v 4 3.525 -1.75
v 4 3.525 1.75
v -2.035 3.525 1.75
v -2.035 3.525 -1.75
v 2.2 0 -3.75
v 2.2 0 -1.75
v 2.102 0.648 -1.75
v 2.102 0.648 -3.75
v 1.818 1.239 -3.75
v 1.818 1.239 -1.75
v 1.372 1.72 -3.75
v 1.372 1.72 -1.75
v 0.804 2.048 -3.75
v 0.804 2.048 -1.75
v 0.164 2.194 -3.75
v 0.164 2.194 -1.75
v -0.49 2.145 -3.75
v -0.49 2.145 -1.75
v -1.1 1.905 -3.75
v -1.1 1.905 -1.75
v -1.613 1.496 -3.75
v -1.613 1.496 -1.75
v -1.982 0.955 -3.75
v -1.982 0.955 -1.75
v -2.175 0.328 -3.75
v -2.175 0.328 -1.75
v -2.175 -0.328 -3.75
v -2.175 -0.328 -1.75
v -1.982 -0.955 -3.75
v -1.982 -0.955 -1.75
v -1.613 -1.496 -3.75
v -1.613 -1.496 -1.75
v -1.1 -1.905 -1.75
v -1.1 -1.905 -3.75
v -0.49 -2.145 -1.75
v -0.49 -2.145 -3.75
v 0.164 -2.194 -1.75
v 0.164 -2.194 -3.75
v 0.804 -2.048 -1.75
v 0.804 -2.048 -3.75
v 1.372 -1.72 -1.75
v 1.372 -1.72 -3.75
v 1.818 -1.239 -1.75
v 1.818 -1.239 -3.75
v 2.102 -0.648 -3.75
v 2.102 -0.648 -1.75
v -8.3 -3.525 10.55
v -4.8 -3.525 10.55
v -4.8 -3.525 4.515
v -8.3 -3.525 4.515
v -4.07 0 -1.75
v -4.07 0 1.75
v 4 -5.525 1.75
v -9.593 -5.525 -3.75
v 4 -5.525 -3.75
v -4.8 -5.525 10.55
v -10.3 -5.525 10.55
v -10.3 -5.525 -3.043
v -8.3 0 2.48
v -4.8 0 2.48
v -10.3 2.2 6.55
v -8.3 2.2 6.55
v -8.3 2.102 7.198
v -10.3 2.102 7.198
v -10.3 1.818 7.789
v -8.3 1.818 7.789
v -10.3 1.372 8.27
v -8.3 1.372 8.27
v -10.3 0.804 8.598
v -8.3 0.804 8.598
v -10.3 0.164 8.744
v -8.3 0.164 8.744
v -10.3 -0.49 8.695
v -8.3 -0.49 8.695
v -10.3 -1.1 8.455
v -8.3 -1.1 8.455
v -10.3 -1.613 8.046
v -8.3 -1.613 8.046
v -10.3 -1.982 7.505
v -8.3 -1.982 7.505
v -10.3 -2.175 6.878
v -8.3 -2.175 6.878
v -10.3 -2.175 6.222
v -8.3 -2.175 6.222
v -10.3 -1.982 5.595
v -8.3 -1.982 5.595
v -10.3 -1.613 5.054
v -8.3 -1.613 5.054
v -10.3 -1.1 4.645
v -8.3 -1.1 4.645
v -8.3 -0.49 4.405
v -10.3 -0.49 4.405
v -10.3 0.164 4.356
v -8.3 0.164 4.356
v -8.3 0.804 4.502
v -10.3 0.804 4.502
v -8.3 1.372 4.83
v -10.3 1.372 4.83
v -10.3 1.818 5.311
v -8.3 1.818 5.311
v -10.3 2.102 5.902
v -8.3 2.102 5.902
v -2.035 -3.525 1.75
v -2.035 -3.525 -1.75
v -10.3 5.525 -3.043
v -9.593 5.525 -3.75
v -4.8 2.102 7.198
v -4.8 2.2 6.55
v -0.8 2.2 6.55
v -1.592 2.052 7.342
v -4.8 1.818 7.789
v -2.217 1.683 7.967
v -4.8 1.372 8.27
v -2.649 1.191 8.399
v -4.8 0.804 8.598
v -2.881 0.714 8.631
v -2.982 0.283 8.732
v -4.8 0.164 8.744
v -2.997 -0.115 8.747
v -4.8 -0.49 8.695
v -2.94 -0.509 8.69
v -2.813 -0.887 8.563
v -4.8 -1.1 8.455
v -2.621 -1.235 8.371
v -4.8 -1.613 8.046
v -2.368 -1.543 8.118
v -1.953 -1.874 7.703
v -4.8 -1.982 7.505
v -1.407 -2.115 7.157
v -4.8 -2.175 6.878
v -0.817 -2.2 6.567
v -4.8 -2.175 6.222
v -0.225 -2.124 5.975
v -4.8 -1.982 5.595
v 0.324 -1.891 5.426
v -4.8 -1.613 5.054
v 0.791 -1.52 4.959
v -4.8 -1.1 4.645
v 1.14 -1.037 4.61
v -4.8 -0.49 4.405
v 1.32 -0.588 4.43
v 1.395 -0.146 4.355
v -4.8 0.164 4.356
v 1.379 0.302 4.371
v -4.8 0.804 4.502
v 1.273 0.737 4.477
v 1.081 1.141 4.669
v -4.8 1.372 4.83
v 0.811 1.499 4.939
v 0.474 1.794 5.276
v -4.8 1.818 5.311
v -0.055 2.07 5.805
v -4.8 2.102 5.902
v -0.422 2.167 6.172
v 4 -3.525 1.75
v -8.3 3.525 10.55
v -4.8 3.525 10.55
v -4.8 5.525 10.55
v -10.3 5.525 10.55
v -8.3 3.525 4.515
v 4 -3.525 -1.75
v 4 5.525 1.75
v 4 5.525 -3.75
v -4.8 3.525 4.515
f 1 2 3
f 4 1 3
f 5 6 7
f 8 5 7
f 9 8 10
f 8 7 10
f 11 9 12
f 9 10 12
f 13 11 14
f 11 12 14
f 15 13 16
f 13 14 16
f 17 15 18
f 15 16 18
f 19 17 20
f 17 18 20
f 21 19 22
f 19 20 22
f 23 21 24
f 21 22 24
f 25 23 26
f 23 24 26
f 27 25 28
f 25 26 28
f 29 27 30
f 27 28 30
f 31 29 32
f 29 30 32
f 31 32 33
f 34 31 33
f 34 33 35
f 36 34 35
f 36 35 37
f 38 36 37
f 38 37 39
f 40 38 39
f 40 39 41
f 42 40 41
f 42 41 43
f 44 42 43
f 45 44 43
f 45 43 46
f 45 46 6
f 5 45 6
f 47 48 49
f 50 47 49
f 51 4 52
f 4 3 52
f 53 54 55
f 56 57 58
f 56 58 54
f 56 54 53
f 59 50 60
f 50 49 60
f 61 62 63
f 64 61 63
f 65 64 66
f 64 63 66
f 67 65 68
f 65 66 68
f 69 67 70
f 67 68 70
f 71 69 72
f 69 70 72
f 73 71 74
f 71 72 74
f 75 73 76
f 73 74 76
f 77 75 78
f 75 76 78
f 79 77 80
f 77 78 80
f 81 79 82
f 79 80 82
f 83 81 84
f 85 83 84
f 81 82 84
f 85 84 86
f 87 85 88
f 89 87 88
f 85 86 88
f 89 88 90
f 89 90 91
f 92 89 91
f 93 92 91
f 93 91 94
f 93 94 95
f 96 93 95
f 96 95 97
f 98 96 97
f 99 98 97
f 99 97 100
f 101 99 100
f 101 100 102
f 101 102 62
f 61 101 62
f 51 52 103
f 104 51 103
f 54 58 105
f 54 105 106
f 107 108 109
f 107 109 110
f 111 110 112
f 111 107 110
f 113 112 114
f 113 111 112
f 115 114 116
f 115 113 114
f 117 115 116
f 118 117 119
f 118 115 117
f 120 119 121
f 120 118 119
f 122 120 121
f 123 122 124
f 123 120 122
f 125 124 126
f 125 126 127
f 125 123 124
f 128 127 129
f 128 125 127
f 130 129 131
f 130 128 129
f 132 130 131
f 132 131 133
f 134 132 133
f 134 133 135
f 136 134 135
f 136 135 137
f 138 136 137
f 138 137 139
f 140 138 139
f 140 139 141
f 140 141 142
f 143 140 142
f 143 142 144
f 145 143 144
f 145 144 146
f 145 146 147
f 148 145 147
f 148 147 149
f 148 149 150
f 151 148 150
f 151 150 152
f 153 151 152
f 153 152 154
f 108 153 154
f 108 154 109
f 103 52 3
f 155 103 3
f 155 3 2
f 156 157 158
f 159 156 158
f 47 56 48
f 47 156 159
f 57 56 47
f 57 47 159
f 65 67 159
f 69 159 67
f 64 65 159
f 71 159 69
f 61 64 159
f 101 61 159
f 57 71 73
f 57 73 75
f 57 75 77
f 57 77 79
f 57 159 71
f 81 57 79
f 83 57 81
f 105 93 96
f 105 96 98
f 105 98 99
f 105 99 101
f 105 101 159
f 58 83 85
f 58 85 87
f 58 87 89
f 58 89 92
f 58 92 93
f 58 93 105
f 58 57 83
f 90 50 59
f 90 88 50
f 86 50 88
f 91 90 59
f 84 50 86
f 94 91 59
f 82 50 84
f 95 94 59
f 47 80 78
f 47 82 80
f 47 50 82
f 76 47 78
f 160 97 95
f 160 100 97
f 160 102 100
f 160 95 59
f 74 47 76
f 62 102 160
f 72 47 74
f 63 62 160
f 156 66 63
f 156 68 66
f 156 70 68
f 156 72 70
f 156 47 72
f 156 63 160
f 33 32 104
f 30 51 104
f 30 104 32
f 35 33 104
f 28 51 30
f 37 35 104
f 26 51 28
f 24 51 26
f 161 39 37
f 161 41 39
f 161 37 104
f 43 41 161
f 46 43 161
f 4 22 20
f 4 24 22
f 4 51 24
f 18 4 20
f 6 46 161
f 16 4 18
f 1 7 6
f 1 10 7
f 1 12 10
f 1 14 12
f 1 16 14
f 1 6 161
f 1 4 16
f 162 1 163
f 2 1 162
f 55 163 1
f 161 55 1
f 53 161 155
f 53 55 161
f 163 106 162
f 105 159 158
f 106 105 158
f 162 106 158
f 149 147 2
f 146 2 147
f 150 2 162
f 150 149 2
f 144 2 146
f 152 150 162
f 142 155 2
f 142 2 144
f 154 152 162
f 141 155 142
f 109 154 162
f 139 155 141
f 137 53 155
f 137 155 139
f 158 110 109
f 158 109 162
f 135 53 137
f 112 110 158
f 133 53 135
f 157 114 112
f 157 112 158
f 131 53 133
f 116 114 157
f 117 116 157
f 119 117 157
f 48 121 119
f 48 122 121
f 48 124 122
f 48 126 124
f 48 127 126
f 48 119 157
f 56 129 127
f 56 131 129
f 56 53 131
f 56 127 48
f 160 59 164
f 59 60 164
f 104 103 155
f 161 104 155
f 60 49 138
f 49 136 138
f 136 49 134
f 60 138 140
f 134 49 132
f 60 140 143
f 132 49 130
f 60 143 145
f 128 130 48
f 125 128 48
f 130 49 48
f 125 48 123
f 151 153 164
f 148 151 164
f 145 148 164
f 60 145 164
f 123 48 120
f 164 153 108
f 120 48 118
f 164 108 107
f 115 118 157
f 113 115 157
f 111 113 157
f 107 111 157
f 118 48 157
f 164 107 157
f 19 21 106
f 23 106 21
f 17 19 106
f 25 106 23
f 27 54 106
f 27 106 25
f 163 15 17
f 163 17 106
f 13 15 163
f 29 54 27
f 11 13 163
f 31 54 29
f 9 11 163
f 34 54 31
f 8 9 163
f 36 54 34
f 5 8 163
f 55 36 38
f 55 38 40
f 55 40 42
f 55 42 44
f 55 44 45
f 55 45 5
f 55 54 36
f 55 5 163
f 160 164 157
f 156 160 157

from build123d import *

# Parameters (mm, degrees)
PAD_DEPTH         = 1.75
PAD001_DEPTH      = 1.75
PAD002_DEPTH      = 5.525
SKETCH003_R       = 2.2
POCKET_DEPTH      = 2.001
POCKET_DEPTH_BACK = -12.301
SKETCH004_R       = 2.2
POCKET001_DEPTH   = 2.001


with BuildPart() as pad:
    # Sketch → Pad (new body, symmetric)
    with BuildSketch(Plane.XY):
        Polygon((2.03516, 3.525), (-2.03516, 3.525), (-4.070319, 0), (-2.03516, -3.525), (2.03516, -3.525), (4.070319, -3.525), (4.070319, 3.525), align=None)
    extrude(amount=PAD_DEPTH, both=True)


with BuildPart() as pad001:
    # Sketch001 → Pad001 (new body, symmetric)
    with BuildSketch(Plane.YZ.offset(-6.55)):
        Polygon((0, 2.479681), (3.525, 4.51484), (3.525, 8.58516), (3.525, 10.620319), (-3.525, 10.620319), (-3.525, 8.58516), (-3.525, 4.51484), align=None)
    extrude(amount=PAD001_DEPTH, both=True)


with BuildPart() as pocket001:
    # Sketch002 → Pad002 (new body, symmetric)
    with BuildSketch(Plane.XZ):
        Polygon((-10.3, 10.55), (-10.3, -3.042893), (-9.592893, -3.75), (4, -3.75), (4, 1.75), (-4.8, 10.55), align=None)
    extrude(amount=PAD002_DEPTH, both=True)

    # Cut: cut Pad001
    add(pad001.part, mode=Mode.SUBTRACT)

    # Cut001: cut Pad
    add(pad.part, mode=Mode.SUBTRACT)

    # Sketch003 → Pocket (cut, two sides)
    with BuildSketch(Plane.YZ.offset(-8.3)) as pocket_sk:
        with Locations((0, 6.55)):
            Circle(SKETCH003_R)
    extrude(amount=-POCKET_DEPTH, mode=Mode.SUBTRACT)
    extrude(pocket_sk.sketch, amount=-POCKET_DEPTH_BACK, mode=Mode.SUBTRACT)

    # Sketch004 → Pocket001 (cut, through all)
    with BuildSketch(Plane.XY.offset(-1.75)):
        Circle(SKETCH004_R)
    extrude(amount=-POCKET001_DEPTH, mode=Mode.SUBTRACT)


solid = pocket001.part
